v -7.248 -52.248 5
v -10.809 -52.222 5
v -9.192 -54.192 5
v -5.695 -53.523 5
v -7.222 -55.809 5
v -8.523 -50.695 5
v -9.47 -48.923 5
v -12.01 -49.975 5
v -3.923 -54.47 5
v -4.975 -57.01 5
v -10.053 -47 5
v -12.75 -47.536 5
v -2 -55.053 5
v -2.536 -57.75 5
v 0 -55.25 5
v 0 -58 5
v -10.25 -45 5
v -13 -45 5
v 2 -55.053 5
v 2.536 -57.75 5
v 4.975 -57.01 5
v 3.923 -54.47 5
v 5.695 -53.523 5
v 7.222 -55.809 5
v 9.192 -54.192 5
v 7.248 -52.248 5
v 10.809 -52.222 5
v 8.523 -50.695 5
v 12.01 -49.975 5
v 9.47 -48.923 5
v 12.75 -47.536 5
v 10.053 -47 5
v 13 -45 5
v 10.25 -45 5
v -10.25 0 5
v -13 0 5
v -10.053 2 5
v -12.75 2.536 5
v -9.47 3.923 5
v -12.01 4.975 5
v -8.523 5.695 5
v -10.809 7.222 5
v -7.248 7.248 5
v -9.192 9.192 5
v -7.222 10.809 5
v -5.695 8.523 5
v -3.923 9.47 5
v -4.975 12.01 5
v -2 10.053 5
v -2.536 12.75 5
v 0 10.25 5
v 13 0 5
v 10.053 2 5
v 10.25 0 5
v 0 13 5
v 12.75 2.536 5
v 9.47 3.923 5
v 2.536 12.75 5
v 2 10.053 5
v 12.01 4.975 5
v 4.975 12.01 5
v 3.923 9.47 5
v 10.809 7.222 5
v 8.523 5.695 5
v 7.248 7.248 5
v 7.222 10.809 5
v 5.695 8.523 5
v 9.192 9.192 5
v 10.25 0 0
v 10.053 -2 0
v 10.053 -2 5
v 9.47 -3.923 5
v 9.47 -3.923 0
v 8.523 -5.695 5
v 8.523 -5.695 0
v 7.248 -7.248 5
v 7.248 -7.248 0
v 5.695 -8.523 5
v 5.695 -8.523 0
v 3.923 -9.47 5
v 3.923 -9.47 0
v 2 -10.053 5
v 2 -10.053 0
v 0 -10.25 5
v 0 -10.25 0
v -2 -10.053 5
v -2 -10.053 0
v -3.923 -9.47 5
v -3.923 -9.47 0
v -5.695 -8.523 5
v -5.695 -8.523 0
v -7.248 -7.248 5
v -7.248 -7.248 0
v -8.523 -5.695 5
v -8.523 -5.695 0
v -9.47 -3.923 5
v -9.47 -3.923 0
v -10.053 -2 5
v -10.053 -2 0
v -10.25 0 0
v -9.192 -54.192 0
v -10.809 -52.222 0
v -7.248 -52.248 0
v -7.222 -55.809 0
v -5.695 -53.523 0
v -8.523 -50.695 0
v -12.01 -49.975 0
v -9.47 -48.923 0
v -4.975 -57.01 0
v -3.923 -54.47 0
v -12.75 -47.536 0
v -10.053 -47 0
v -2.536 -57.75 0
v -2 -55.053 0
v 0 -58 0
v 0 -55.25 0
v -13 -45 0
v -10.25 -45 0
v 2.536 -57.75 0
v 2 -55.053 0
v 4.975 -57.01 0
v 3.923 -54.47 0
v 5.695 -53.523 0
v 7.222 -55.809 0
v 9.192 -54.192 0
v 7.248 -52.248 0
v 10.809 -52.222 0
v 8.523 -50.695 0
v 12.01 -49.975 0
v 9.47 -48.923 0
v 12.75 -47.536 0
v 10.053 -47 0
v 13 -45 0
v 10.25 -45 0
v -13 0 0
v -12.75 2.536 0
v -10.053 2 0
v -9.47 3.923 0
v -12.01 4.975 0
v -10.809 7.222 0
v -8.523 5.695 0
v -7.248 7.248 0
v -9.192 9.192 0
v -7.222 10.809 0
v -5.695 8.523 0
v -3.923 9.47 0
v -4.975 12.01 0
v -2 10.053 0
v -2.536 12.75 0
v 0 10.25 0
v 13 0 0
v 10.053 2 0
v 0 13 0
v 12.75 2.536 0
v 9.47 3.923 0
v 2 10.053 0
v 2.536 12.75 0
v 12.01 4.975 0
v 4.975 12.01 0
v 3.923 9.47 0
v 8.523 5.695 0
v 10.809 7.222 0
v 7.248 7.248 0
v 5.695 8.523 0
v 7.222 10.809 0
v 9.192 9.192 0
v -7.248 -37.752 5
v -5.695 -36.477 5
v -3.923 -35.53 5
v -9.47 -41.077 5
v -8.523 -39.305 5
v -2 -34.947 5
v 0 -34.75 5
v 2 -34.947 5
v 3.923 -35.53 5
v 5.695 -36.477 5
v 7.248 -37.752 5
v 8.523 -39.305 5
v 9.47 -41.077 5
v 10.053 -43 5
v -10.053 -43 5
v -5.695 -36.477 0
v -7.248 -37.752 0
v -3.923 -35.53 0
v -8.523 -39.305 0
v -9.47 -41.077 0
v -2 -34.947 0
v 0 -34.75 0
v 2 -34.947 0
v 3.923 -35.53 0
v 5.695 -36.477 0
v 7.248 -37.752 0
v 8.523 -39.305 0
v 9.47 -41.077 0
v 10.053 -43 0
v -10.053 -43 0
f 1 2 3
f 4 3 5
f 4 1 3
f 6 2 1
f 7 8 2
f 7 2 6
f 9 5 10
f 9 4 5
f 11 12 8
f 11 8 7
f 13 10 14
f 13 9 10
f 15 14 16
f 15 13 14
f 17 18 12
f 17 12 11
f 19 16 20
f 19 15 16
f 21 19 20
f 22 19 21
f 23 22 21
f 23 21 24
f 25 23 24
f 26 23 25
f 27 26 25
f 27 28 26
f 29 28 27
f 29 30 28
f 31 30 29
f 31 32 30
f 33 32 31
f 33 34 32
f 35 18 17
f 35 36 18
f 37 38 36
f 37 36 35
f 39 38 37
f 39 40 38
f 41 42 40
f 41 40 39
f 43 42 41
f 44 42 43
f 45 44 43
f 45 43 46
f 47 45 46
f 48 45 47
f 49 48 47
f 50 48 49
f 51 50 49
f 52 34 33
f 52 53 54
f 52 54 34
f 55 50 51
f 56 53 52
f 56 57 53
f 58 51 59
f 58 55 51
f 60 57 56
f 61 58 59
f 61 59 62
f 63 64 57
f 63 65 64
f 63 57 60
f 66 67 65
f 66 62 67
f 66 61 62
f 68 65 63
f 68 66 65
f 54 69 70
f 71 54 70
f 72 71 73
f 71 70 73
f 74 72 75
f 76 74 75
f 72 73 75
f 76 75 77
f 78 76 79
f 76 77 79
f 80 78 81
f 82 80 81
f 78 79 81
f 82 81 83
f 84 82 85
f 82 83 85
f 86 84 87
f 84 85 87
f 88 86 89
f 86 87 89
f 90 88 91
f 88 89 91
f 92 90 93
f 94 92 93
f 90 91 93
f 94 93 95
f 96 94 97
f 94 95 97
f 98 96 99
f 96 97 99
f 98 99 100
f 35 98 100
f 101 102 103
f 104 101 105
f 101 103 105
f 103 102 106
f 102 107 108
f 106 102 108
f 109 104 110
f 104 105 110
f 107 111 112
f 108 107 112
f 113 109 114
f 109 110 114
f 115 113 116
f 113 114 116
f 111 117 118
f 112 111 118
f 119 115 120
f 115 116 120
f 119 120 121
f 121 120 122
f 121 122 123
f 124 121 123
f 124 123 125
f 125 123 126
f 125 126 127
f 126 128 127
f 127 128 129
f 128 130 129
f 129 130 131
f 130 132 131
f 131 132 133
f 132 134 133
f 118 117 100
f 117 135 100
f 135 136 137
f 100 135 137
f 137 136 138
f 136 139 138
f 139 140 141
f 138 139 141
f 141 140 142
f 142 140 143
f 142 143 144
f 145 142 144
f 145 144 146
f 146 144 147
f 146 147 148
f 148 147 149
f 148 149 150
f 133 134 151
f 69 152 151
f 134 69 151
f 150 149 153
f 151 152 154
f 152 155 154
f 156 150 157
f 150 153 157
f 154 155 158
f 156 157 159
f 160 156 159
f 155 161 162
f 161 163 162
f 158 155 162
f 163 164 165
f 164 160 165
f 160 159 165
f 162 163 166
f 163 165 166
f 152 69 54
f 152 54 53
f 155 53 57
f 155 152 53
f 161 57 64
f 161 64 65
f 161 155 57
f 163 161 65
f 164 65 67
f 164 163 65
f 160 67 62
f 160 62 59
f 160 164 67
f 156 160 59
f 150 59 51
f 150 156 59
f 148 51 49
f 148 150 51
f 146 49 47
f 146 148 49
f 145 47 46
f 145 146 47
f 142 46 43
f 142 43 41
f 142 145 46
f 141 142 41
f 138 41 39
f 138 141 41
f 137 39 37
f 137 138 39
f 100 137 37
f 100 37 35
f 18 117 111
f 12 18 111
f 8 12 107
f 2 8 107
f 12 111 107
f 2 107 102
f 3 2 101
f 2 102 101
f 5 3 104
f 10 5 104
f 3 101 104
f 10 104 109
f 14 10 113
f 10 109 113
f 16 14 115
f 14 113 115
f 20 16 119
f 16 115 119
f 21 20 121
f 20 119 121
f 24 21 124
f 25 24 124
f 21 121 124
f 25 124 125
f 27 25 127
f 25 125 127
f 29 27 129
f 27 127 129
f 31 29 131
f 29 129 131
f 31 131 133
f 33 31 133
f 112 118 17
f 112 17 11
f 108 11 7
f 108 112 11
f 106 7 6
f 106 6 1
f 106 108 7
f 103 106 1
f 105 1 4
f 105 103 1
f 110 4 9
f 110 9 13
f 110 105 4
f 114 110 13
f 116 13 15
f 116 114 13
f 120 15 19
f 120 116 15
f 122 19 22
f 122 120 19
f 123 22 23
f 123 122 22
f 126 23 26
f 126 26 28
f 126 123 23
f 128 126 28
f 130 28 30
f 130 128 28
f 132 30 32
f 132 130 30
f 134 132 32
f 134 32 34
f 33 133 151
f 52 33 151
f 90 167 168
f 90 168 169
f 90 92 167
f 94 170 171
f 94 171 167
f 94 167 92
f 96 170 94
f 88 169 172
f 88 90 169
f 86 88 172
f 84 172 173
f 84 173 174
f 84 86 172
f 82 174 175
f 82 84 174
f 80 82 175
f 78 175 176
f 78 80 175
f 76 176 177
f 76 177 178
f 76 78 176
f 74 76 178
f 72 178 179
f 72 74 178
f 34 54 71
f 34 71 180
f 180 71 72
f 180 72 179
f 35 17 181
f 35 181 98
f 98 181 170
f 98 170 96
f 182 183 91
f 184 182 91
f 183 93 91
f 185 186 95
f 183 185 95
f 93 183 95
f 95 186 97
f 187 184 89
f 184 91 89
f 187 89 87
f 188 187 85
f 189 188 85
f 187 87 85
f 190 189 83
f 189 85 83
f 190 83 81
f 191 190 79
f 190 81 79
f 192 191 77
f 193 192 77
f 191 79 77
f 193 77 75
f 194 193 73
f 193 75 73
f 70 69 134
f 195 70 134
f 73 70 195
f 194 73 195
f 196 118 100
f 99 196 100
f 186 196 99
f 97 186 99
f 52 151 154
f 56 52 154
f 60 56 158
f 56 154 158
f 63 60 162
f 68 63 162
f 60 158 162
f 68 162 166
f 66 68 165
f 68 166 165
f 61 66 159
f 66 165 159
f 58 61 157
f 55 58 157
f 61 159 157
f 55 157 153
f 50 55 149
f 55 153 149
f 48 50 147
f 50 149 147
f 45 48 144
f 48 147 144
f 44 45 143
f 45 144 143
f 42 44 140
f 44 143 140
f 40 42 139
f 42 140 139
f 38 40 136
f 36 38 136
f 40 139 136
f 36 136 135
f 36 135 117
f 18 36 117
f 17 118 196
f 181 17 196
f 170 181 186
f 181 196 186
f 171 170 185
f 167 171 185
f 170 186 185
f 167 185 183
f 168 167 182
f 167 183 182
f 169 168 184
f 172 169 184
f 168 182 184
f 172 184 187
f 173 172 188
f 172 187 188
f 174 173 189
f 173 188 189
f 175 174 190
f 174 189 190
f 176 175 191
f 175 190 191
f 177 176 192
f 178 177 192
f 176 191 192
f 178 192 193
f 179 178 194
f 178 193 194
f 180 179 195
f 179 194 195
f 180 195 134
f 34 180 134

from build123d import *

# Parameters (mm, degrees)
SKETCH1_R           = 10.25
BOSS_EXTRUDE1_DEPTH = 5


with BuildPart() as part:
    # Sketch1 → Boss-Extrude1 (new body)
    with BuildSketch(Plane.XY):
        with BuildLine():
            Line((13, -45), (13, 0))
            ThreePointArc((13, 0), (0, 13), (-13, 0))
            Line((-13, 0), (-13, -45))
            ThreePointArc((-13, -45), (0, -58), (13, -45))
        make_face()
        with Locations((0, -45)):
            Circle(SKETCH1_R, mode=Mode.SUBTRACT)
        Circle(SKETCH1_R, mode=Mode.SUBTRACT)
    extrude(amount=BOSS_EXTRUDE1_DEPTH)


solid = part.part
